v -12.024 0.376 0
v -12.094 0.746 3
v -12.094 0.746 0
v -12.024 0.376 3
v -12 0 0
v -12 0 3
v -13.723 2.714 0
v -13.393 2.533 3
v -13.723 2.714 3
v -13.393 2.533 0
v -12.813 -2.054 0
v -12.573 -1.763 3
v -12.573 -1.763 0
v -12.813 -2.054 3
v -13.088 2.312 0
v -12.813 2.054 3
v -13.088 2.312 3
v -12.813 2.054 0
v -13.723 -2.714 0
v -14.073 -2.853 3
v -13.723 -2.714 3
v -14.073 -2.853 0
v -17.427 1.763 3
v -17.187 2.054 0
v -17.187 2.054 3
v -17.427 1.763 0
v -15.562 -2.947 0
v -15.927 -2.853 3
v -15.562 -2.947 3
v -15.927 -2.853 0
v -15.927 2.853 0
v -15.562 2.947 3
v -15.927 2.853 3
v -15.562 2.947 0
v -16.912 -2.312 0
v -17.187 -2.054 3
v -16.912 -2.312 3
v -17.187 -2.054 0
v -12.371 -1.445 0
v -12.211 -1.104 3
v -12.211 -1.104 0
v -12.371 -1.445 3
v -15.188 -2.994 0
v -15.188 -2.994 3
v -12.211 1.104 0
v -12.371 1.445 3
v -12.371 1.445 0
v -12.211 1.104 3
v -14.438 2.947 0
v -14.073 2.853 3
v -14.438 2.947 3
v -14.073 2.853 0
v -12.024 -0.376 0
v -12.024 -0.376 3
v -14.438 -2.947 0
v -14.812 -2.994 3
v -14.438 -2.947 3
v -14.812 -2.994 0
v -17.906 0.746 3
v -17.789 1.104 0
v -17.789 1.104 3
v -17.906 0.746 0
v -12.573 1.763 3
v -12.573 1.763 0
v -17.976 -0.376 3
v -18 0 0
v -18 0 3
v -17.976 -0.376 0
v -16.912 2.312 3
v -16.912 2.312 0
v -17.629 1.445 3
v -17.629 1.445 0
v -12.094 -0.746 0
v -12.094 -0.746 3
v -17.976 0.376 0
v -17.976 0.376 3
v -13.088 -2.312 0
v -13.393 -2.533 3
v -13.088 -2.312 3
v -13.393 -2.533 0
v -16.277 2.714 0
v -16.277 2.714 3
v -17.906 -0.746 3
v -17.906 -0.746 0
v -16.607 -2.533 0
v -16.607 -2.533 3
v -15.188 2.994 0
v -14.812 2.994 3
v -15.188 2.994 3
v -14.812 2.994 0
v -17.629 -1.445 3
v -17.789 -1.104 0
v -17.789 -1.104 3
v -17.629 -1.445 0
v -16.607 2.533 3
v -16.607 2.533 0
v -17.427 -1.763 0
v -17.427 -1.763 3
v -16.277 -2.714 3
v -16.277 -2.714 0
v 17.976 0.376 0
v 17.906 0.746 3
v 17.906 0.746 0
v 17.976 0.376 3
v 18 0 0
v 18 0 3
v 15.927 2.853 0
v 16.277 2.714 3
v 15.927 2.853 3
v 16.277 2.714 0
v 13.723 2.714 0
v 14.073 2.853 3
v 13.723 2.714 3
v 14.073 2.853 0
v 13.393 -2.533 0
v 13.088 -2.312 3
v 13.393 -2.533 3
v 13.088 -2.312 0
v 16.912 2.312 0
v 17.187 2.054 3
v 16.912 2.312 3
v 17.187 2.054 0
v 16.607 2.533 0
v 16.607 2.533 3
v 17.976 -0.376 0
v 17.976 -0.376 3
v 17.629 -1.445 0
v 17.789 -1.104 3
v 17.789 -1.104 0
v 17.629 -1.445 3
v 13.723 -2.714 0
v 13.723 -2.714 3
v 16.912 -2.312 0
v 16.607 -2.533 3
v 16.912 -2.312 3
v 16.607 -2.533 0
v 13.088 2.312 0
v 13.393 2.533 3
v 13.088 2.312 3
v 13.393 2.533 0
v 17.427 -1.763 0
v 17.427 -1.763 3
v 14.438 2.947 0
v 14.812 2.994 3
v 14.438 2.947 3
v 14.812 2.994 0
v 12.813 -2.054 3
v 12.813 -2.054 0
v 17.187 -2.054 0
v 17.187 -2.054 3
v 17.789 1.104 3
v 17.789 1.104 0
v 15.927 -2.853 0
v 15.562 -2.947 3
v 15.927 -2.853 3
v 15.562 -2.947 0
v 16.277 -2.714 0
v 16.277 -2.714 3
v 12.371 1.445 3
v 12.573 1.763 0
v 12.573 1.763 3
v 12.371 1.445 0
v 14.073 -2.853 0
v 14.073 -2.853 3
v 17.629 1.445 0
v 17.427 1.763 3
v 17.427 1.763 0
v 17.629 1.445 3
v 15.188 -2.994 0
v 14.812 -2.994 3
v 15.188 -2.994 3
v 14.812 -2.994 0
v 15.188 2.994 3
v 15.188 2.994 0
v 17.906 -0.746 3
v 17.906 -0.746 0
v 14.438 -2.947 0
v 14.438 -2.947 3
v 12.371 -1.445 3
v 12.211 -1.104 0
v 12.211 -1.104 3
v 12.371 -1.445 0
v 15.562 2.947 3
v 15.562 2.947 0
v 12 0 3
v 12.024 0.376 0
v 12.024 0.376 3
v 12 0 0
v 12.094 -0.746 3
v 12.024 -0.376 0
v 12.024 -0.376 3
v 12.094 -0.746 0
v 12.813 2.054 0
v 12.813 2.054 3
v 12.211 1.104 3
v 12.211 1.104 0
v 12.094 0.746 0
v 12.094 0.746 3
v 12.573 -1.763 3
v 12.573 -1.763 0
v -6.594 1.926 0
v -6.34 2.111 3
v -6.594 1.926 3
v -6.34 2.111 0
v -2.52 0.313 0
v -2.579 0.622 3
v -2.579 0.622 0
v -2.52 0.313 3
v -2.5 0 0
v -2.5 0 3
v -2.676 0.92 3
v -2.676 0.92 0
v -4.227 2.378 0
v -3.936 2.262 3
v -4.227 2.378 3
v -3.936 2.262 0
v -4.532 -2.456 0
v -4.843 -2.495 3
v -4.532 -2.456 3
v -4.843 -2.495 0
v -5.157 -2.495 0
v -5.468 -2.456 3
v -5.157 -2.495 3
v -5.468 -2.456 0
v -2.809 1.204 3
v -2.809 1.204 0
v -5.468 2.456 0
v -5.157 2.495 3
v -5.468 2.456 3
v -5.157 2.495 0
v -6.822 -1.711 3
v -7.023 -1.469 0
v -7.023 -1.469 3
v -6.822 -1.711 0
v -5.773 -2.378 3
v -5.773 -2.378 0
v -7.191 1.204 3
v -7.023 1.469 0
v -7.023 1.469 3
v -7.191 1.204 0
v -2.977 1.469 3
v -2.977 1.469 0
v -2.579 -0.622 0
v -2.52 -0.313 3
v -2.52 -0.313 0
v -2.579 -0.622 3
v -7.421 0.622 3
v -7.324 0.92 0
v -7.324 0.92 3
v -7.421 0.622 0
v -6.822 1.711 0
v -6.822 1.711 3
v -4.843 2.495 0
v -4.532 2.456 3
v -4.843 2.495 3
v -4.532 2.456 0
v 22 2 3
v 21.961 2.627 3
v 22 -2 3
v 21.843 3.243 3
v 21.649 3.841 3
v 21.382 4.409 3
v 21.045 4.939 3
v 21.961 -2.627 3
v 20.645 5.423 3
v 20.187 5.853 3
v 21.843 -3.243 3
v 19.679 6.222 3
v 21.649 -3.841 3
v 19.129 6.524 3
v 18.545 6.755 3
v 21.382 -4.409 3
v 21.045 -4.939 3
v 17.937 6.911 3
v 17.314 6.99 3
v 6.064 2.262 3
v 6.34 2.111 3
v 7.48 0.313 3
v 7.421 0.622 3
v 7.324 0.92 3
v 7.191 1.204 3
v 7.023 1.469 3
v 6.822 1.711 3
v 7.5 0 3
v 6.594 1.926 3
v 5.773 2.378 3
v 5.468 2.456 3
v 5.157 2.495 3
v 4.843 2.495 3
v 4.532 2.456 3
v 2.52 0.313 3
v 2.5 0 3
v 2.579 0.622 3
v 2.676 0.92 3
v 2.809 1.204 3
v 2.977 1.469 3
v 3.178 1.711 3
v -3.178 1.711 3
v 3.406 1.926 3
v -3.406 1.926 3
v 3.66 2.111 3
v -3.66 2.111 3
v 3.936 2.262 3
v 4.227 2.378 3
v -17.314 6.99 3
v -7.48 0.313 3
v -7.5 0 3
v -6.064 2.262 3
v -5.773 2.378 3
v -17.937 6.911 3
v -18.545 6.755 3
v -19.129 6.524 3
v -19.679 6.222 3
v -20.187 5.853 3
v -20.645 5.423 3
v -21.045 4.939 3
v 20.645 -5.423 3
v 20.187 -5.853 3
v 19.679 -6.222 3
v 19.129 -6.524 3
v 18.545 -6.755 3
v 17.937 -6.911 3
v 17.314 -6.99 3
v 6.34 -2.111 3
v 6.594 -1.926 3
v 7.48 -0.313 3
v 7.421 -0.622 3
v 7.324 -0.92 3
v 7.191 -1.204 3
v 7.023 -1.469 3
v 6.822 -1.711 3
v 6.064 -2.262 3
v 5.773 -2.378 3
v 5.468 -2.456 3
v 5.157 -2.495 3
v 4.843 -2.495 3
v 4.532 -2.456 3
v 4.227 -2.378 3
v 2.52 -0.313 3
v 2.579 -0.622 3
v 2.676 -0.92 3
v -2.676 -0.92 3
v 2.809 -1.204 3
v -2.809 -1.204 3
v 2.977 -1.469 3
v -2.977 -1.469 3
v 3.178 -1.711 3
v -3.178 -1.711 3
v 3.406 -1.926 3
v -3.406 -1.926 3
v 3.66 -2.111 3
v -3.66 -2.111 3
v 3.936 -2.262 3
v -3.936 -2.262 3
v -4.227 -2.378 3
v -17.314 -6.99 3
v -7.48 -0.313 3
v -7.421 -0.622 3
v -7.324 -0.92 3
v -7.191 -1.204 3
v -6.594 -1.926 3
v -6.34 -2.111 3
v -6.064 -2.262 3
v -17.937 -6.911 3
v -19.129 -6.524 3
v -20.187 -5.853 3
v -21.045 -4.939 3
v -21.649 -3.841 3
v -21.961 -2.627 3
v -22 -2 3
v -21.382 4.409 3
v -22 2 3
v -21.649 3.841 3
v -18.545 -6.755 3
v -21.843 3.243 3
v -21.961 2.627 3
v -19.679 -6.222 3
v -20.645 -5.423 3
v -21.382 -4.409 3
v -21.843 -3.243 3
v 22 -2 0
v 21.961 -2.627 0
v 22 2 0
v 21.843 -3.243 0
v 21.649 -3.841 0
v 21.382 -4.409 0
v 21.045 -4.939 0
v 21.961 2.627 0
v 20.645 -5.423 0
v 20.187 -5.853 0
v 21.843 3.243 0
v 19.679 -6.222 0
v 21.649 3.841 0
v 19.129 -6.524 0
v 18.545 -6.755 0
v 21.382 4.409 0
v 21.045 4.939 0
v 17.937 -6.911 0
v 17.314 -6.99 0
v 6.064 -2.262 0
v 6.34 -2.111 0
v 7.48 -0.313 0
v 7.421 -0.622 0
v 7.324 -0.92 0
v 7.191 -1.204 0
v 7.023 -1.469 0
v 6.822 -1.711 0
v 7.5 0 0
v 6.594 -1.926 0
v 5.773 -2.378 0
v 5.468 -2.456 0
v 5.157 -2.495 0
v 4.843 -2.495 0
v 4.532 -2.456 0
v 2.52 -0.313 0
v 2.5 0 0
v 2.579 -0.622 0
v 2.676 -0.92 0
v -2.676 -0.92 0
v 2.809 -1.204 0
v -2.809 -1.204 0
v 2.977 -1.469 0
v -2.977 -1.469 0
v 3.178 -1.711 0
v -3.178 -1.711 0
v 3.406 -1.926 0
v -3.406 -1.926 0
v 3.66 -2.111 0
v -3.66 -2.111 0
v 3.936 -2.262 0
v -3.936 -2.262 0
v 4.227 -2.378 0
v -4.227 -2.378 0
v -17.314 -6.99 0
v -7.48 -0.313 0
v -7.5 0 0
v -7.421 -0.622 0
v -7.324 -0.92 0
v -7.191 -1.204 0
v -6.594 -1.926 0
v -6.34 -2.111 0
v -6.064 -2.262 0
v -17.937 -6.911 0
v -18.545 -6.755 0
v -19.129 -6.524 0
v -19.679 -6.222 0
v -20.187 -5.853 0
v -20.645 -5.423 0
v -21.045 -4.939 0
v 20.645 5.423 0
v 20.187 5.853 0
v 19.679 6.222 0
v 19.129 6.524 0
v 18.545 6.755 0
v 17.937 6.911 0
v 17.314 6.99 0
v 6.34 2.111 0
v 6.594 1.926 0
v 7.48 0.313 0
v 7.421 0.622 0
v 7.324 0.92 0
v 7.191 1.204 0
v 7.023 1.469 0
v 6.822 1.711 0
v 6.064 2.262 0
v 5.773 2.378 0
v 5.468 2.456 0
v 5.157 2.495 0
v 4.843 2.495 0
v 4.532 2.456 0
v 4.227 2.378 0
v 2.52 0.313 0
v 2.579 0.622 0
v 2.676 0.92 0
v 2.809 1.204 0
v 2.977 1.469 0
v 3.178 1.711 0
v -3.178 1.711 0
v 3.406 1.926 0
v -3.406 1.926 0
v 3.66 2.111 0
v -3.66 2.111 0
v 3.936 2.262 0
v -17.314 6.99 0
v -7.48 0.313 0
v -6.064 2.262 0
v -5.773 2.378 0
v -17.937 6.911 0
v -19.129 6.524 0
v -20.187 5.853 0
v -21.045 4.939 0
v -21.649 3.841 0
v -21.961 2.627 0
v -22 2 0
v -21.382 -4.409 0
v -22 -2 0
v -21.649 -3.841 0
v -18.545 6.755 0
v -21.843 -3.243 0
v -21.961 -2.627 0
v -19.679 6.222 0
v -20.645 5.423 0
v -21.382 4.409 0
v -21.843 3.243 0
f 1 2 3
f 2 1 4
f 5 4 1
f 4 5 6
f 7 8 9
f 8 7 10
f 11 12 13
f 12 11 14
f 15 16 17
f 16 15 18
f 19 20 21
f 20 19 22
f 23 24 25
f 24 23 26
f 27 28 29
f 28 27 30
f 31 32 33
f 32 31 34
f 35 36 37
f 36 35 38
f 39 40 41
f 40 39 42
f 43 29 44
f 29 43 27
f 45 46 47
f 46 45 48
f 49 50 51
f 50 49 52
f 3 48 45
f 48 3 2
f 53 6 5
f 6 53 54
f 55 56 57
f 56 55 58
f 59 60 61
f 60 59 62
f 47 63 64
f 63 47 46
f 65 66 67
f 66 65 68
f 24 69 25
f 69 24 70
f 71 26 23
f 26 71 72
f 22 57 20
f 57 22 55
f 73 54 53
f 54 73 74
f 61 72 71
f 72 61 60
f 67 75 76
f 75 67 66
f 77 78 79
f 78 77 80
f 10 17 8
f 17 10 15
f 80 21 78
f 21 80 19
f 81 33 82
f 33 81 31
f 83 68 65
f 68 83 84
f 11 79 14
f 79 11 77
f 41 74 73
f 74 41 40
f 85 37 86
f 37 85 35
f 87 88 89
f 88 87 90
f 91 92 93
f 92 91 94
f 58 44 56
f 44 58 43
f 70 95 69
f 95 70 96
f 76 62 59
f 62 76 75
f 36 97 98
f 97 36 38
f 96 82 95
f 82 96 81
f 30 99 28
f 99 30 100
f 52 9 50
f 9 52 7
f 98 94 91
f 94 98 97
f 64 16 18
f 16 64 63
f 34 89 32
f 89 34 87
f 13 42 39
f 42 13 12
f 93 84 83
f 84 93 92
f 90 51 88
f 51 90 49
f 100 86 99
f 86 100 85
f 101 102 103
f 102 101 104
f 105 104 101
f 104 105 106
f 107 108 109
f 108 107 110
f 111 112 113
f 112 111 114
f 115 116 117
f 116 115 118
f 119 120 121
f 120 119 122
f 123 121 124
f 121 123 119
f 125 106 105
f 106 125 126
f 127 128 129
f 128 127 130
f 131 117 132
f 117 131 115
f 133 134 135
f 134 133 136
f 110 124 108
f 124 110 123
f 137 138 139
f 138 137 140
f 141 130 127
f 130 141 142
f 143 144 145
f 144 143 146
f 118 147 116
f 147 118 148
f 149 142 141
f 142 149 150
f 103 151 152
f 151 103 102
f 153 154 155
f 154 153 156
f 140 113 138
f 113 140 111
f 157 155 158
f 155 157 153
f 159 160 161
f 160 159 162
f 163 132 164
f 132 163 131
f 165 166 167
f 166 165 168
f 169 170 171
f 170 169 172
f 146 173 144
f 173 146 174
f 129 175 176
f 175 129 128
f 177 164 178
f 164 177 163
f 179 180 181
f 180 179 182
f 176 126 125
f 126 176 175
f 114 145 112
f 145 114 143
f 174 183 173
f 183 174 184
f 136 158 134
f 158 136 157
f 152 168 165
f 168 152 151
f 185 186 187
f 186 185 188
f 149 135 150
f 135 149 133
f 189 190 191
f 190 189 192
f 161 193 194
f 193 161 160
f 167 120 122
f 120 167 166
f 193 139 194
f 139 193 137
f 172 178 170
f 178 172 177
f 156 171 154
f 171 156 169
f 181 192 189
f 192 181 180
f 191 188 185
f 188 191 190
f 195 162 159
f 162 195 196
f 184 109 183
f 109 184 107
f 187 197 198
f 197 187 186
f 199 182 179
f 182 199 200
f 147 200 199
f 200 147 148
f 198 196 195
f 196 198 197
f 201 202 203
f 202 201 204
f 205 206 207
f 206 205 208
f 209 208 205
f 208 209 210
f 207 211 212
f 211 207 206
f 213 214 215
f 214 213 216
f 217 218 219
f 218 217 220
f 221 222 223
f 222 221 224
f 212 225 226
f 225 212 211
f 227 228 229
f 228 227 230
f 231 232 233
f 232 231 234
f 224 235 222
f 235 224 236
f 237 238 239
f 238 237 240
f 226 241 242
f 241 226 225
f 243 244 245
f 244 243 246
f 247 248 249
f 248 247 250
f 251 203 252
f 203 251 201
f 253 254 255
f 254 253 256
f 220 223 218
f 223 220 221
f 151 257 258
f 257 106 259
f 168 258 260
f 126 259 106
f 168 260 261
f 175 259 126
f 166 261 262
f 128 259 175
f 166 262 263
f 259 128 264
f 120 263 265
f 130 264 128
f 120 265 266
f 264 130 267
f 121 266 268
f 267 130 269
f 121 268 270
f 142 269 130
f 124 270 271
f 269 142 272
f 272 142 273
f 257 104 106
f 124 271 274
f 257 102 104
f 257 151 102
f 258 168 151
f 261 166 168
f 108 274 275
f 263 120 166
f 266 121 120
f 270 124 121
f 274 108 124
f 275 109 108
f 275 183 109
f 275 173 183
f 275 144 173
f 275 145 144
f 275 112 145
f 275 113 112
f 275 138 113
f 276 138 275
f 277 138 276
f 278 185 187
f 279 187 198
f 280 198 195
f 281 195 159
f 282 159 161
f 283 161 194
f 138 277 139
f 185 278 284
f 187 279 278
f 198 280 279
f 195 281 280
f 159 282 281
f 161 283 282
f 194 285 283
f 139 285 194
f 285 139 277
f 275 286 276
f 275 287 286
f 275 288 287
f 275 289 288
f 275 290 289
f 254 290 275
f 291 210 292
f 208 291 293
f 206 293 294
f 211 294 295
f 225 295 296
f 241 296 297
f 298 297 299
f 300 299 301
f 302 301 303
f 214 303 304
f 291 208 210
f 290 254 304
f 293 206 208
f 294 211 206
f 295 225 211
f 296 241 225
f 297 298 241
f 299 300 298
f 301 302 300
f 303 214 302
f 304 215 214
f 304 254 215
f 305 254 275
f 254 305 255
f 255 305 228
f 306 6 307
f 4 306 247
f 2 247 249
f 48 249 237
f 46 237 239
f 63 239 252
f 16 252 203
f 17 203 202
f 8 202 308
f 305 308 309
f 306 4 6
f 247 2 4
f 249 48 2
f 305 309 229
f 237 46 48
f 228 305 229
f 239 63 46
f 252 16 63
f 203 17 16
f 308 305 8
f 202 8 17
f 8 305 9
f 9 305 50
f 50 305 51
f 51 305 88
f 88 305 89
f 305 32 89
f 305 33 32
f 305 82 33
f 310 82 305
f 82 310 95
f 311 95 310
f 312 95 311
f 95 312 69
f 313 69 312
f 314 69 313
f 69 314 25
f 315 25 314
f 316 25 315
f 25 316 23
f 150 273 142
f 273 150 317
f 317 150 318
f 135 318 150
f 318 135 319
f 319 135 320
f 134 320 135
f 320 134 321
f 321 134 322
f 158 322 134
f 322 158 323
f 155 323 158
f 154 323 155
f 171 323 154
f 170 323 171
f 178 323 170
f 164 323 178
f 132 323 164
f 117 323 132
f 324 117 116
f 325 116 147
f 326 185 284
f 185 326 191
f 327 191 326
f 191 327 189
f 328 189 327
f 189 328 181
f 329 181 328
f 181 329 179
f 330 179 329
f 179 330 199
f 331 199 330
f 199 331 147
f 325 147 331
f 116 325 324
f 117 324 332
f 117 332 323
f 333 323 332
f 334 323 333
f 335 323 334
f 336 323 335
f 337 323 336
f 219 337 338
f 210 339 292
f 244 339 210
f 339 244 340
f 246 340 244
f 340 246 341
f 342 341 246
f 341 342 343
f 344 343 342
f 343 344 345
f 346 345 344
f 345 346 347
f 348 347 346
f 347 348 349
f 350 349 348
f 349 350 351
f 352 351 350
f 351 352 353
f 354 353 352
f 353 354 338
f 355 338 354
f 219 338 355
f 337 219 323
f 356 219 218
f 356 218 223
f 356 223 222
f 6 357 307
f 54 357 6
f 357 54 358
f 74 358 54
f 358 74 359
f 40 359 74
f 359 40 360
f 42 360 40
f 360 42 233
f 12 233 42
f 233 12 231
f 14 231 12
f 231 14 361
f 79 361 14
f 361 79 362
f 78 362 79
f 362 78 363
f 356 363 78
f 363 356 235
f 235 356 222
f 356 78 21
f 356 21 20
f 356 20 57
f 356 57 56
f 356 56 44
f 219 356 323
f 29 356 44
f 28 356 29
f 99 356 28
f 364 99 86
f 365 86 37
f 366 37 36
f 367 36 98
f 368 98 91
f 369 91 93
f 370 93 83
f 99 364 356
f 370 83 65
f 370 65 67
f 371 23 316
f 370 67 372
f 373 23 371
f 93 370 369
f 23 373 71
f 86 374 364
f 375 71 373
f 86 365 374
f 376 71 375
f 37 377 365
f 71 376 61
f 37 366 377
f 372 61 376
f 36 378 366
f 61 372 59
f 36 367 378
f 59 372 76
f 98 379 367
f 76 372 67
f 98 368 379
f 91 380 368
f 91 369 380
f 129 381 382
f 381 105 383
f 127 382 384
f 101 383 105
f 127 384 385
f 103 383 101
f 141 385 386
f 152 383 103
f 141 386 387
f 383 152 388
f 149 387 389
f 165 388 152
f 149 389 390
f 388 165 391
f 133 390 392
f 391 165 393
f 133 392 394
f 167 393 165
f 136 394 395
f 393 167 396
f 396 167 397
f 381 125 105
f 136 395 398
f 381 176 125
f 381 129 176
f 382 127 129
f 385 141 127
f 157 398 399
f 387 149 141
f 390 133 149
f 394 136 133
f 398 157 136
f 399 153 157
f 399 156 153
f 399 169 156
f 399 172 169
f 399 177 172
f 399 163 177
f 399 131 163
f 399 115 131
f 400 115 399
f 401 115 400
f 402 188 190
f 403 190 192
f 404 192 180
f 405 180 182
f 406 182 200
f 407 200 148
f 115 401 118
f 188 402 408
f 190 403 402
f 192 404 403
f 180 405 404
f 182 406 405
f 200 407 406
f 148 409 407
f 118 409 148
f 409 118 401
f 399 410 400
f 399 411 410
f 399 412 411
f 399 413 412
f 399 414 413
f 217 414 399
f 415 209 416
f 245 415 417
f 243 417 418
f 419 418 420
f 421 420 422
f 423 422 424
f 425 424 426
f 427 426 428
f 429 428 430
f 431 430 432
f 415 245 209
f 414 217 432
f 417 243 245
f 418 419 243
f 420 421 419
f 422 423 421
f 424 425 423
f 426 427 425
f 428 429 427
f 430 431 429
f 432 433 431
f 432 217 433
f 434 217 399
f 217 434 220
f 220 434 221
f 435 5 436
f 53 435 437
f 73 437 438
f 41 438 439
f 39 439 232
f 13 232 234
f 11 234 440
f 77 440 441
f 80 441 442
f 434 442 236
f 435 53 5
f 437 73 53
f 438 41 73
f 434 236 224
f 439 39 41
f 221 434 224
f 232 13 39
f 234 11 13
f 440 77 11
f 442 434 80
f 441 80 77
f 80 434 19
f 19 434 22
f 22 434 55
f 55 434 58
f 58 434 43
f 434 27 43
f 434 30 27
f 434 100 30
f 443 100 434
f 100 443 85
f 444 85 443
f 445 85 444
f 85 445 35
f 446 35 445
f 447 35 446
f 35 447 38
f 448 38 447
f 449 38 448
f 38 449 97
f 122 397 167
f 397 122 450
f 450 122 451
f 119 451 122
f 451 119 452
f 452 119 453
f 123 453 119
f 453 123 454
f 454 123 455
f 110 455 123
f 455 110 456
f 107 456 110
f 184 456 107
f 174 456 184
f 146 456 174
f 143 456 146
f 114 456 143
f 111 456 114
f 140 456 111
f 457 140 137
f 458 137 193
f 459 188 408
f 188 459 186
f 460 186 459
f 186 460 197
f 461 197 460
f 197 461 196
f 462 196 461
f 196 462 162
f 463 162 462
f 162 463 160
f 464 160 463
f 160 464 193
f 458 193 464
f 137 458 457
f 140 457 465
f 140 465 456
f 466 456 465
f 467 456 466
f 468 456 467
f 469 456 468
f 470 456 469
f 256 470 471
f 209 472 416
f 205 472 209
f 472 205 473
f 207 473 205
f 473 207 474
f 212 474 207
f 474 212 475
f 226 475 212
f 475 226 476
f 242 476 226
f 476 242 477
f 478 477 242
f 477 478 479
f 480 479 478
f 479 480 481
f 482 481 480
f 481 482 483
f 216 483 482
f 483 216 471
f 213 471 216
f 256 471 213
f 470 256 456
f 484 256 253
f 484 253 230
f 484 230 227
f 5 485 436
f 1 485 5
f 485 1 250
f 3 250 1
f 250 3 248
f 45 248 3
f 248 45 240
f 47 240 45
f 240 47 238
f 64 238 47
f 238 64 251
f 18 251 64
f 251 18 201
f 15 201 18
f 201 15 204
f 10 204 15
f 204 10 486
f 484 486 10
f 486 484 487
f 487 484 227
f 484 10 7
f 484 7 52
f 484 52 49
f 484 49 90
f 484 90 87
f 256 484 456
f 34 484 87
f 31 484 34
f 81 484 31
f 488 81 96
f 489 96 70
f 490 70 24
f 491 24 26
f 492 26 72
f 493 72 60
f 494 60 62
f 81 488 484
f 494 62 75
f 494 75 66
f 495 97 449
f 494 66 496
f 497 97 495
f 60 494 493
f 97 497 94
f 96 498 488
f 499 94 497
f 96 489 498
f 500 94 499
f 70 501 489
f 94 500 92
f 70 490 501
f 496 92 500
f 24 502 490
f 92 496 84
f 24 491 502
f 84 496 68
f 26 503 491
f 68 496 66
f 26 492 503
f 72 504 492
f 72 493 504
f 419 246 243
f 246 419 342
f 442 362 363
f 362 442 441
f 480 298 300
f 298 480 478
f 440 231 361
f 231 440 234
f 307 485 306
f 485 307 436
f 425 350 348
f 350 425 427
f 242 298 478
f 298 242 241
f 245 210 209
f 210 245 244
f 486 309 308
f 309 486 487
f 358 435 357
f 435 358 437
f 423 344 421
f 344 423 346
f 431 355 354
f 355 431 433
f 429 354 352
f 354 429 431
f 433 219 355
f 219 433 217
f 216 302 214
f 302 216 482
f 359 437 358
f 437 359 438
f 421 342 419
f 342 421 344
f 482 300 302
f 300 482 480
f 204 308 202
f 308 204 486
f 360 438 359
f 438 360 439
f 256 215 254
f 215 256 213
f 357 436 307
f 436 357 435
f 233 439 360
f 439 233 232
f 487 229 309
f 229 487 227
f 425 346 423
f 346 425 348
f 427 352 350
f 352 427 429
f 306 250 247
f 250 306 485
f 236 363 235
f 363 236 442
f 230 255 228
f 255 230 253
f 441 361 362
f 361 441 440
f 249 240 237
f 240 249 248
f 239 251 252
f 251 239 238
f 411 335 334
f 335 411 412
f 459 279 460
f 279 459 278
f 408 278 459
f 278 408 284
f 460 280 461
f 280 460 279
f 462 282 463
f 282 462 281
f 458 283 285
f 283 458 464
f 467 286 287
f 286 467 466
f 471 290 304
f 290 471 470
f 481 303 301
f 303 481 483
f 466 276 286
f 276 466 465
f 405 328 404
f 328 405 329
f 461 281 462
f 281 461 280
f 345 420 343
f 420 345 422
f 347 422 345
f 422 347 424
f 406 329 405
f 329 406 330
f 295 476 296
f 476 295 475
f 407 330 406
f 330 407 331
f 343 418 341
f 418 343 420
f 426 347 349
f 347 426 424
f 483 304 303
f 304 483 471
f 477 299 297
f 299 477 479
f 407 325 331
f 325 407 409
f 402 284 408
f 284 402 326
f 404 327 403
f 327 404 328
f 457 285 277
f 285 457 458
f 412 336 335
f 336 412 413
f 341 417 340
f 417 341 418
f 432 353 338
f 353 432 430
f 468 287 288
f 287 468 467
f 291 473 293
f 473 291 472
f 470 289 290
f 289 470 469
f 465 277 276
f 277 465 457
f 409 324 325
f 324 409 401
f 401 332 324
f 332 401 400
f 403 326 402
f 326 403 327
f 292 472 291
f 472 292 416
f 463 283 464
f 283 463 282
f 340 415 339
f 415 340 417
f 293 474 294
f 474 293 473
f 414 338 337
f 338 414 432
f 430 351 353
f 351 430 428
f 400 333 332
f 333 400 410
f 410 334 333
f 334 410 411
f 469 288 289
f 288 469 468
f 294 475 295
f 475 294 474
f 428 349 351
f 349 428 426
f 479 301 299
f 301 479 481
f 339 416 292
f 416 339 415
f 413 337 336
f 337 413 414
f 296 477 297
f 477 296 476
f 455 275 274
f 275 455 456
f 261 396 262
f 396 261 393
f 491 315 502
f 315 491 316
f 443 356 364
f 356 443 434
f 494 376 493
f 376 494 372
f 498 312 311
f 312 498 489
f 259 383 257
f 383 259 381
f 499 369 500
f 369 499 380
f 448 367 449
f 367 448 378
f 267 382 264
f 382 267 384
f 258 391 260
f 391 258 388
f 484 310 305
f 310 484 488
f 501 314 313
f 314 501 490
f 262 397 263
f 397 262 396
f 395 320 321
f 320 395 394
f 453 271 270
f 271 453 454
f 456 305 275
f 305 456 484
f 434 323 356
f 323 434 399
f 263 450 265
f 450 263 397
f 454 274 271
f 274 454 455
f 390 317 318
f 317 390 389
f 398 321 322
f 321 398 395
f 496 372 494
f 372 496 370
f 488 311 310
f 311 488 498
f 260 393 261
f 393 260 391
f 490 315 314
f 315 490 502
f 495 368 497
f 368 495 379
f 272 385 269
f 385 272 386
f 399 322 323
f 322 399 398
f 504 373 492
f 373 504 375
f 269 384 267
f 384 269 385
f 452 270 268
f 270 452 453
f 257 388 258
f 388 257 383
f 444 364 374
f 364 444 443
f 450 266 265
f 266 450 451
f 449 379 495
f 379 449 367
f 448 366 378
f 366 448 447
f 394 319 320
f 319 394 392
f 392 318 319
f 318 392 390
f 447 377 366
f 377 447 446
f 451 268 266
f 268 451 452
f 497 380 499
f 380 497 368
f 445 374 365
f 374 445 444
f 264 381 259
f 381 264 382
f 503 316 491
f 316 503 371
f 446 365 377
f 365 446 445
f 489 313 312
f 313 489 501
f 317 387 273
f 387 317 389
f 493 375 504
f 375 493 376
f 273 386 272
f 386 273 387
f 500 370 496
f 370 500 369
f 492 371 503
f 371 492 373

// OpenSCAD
$fn = 50;


difference() {
	union() {
		hull() {
			translate(v = [-17.0000000000, 2.0000000000, 0]) {
				cylinder(h = 3, r = 5);
			}
			translate(v = [17.0000000000, 2.0000000000, 0]) {
				cylinder(h = 3, r = 5);
			}
			translate(v = [-17.0000000000, -2.0000000000, 0]) {
				cylinder(h = 3, r = 5);
			}
			translate(v = [17.0000000000, -2.0000000000, 0]) {
				cylinder(h = 3, r = 5);
			}
		}
	}
	union() {
		#translate(v = [-15.0000000000, 0.0000000000, -100.0000000000]) {
			cylinder(h = 200, r = 3.0000000000);
		}
		#translate(v = [-15.0000000000, 0.0000000000, -100.0000000000]) {
			cylinder(h = 200, r = 3.0000000000);
		}
		#translate(v = [15.0000000000, 0.0000000000, -100.0000000000]) {
			cylinder(h = 200, r = 3.0000000000);
		}
		#translate(v = [15.0000000000, 0.0000000000, -100.0000000000]) {
			cylinder(h = 200, r = 3.0000000000);
		}
		#translate(v = [-15.0000000000, 0, 0]) {
			cylinder(h = 3, r = 2.5000000000);
		}
		#translate(v = [-5.0000000000, 0, 0]) {
			cylinder(h = 3, r = 2.5000000000);
		}
		#translate(v = [5.0000000000, 0, 0]) {
			cylinder(h = 3, r = 2.5000000000);
		}
		#translate(v = [15.0000000000, 0, 0]) {
			cylinder(h = 3, r = 2.5000000000);
		}
	}
}
